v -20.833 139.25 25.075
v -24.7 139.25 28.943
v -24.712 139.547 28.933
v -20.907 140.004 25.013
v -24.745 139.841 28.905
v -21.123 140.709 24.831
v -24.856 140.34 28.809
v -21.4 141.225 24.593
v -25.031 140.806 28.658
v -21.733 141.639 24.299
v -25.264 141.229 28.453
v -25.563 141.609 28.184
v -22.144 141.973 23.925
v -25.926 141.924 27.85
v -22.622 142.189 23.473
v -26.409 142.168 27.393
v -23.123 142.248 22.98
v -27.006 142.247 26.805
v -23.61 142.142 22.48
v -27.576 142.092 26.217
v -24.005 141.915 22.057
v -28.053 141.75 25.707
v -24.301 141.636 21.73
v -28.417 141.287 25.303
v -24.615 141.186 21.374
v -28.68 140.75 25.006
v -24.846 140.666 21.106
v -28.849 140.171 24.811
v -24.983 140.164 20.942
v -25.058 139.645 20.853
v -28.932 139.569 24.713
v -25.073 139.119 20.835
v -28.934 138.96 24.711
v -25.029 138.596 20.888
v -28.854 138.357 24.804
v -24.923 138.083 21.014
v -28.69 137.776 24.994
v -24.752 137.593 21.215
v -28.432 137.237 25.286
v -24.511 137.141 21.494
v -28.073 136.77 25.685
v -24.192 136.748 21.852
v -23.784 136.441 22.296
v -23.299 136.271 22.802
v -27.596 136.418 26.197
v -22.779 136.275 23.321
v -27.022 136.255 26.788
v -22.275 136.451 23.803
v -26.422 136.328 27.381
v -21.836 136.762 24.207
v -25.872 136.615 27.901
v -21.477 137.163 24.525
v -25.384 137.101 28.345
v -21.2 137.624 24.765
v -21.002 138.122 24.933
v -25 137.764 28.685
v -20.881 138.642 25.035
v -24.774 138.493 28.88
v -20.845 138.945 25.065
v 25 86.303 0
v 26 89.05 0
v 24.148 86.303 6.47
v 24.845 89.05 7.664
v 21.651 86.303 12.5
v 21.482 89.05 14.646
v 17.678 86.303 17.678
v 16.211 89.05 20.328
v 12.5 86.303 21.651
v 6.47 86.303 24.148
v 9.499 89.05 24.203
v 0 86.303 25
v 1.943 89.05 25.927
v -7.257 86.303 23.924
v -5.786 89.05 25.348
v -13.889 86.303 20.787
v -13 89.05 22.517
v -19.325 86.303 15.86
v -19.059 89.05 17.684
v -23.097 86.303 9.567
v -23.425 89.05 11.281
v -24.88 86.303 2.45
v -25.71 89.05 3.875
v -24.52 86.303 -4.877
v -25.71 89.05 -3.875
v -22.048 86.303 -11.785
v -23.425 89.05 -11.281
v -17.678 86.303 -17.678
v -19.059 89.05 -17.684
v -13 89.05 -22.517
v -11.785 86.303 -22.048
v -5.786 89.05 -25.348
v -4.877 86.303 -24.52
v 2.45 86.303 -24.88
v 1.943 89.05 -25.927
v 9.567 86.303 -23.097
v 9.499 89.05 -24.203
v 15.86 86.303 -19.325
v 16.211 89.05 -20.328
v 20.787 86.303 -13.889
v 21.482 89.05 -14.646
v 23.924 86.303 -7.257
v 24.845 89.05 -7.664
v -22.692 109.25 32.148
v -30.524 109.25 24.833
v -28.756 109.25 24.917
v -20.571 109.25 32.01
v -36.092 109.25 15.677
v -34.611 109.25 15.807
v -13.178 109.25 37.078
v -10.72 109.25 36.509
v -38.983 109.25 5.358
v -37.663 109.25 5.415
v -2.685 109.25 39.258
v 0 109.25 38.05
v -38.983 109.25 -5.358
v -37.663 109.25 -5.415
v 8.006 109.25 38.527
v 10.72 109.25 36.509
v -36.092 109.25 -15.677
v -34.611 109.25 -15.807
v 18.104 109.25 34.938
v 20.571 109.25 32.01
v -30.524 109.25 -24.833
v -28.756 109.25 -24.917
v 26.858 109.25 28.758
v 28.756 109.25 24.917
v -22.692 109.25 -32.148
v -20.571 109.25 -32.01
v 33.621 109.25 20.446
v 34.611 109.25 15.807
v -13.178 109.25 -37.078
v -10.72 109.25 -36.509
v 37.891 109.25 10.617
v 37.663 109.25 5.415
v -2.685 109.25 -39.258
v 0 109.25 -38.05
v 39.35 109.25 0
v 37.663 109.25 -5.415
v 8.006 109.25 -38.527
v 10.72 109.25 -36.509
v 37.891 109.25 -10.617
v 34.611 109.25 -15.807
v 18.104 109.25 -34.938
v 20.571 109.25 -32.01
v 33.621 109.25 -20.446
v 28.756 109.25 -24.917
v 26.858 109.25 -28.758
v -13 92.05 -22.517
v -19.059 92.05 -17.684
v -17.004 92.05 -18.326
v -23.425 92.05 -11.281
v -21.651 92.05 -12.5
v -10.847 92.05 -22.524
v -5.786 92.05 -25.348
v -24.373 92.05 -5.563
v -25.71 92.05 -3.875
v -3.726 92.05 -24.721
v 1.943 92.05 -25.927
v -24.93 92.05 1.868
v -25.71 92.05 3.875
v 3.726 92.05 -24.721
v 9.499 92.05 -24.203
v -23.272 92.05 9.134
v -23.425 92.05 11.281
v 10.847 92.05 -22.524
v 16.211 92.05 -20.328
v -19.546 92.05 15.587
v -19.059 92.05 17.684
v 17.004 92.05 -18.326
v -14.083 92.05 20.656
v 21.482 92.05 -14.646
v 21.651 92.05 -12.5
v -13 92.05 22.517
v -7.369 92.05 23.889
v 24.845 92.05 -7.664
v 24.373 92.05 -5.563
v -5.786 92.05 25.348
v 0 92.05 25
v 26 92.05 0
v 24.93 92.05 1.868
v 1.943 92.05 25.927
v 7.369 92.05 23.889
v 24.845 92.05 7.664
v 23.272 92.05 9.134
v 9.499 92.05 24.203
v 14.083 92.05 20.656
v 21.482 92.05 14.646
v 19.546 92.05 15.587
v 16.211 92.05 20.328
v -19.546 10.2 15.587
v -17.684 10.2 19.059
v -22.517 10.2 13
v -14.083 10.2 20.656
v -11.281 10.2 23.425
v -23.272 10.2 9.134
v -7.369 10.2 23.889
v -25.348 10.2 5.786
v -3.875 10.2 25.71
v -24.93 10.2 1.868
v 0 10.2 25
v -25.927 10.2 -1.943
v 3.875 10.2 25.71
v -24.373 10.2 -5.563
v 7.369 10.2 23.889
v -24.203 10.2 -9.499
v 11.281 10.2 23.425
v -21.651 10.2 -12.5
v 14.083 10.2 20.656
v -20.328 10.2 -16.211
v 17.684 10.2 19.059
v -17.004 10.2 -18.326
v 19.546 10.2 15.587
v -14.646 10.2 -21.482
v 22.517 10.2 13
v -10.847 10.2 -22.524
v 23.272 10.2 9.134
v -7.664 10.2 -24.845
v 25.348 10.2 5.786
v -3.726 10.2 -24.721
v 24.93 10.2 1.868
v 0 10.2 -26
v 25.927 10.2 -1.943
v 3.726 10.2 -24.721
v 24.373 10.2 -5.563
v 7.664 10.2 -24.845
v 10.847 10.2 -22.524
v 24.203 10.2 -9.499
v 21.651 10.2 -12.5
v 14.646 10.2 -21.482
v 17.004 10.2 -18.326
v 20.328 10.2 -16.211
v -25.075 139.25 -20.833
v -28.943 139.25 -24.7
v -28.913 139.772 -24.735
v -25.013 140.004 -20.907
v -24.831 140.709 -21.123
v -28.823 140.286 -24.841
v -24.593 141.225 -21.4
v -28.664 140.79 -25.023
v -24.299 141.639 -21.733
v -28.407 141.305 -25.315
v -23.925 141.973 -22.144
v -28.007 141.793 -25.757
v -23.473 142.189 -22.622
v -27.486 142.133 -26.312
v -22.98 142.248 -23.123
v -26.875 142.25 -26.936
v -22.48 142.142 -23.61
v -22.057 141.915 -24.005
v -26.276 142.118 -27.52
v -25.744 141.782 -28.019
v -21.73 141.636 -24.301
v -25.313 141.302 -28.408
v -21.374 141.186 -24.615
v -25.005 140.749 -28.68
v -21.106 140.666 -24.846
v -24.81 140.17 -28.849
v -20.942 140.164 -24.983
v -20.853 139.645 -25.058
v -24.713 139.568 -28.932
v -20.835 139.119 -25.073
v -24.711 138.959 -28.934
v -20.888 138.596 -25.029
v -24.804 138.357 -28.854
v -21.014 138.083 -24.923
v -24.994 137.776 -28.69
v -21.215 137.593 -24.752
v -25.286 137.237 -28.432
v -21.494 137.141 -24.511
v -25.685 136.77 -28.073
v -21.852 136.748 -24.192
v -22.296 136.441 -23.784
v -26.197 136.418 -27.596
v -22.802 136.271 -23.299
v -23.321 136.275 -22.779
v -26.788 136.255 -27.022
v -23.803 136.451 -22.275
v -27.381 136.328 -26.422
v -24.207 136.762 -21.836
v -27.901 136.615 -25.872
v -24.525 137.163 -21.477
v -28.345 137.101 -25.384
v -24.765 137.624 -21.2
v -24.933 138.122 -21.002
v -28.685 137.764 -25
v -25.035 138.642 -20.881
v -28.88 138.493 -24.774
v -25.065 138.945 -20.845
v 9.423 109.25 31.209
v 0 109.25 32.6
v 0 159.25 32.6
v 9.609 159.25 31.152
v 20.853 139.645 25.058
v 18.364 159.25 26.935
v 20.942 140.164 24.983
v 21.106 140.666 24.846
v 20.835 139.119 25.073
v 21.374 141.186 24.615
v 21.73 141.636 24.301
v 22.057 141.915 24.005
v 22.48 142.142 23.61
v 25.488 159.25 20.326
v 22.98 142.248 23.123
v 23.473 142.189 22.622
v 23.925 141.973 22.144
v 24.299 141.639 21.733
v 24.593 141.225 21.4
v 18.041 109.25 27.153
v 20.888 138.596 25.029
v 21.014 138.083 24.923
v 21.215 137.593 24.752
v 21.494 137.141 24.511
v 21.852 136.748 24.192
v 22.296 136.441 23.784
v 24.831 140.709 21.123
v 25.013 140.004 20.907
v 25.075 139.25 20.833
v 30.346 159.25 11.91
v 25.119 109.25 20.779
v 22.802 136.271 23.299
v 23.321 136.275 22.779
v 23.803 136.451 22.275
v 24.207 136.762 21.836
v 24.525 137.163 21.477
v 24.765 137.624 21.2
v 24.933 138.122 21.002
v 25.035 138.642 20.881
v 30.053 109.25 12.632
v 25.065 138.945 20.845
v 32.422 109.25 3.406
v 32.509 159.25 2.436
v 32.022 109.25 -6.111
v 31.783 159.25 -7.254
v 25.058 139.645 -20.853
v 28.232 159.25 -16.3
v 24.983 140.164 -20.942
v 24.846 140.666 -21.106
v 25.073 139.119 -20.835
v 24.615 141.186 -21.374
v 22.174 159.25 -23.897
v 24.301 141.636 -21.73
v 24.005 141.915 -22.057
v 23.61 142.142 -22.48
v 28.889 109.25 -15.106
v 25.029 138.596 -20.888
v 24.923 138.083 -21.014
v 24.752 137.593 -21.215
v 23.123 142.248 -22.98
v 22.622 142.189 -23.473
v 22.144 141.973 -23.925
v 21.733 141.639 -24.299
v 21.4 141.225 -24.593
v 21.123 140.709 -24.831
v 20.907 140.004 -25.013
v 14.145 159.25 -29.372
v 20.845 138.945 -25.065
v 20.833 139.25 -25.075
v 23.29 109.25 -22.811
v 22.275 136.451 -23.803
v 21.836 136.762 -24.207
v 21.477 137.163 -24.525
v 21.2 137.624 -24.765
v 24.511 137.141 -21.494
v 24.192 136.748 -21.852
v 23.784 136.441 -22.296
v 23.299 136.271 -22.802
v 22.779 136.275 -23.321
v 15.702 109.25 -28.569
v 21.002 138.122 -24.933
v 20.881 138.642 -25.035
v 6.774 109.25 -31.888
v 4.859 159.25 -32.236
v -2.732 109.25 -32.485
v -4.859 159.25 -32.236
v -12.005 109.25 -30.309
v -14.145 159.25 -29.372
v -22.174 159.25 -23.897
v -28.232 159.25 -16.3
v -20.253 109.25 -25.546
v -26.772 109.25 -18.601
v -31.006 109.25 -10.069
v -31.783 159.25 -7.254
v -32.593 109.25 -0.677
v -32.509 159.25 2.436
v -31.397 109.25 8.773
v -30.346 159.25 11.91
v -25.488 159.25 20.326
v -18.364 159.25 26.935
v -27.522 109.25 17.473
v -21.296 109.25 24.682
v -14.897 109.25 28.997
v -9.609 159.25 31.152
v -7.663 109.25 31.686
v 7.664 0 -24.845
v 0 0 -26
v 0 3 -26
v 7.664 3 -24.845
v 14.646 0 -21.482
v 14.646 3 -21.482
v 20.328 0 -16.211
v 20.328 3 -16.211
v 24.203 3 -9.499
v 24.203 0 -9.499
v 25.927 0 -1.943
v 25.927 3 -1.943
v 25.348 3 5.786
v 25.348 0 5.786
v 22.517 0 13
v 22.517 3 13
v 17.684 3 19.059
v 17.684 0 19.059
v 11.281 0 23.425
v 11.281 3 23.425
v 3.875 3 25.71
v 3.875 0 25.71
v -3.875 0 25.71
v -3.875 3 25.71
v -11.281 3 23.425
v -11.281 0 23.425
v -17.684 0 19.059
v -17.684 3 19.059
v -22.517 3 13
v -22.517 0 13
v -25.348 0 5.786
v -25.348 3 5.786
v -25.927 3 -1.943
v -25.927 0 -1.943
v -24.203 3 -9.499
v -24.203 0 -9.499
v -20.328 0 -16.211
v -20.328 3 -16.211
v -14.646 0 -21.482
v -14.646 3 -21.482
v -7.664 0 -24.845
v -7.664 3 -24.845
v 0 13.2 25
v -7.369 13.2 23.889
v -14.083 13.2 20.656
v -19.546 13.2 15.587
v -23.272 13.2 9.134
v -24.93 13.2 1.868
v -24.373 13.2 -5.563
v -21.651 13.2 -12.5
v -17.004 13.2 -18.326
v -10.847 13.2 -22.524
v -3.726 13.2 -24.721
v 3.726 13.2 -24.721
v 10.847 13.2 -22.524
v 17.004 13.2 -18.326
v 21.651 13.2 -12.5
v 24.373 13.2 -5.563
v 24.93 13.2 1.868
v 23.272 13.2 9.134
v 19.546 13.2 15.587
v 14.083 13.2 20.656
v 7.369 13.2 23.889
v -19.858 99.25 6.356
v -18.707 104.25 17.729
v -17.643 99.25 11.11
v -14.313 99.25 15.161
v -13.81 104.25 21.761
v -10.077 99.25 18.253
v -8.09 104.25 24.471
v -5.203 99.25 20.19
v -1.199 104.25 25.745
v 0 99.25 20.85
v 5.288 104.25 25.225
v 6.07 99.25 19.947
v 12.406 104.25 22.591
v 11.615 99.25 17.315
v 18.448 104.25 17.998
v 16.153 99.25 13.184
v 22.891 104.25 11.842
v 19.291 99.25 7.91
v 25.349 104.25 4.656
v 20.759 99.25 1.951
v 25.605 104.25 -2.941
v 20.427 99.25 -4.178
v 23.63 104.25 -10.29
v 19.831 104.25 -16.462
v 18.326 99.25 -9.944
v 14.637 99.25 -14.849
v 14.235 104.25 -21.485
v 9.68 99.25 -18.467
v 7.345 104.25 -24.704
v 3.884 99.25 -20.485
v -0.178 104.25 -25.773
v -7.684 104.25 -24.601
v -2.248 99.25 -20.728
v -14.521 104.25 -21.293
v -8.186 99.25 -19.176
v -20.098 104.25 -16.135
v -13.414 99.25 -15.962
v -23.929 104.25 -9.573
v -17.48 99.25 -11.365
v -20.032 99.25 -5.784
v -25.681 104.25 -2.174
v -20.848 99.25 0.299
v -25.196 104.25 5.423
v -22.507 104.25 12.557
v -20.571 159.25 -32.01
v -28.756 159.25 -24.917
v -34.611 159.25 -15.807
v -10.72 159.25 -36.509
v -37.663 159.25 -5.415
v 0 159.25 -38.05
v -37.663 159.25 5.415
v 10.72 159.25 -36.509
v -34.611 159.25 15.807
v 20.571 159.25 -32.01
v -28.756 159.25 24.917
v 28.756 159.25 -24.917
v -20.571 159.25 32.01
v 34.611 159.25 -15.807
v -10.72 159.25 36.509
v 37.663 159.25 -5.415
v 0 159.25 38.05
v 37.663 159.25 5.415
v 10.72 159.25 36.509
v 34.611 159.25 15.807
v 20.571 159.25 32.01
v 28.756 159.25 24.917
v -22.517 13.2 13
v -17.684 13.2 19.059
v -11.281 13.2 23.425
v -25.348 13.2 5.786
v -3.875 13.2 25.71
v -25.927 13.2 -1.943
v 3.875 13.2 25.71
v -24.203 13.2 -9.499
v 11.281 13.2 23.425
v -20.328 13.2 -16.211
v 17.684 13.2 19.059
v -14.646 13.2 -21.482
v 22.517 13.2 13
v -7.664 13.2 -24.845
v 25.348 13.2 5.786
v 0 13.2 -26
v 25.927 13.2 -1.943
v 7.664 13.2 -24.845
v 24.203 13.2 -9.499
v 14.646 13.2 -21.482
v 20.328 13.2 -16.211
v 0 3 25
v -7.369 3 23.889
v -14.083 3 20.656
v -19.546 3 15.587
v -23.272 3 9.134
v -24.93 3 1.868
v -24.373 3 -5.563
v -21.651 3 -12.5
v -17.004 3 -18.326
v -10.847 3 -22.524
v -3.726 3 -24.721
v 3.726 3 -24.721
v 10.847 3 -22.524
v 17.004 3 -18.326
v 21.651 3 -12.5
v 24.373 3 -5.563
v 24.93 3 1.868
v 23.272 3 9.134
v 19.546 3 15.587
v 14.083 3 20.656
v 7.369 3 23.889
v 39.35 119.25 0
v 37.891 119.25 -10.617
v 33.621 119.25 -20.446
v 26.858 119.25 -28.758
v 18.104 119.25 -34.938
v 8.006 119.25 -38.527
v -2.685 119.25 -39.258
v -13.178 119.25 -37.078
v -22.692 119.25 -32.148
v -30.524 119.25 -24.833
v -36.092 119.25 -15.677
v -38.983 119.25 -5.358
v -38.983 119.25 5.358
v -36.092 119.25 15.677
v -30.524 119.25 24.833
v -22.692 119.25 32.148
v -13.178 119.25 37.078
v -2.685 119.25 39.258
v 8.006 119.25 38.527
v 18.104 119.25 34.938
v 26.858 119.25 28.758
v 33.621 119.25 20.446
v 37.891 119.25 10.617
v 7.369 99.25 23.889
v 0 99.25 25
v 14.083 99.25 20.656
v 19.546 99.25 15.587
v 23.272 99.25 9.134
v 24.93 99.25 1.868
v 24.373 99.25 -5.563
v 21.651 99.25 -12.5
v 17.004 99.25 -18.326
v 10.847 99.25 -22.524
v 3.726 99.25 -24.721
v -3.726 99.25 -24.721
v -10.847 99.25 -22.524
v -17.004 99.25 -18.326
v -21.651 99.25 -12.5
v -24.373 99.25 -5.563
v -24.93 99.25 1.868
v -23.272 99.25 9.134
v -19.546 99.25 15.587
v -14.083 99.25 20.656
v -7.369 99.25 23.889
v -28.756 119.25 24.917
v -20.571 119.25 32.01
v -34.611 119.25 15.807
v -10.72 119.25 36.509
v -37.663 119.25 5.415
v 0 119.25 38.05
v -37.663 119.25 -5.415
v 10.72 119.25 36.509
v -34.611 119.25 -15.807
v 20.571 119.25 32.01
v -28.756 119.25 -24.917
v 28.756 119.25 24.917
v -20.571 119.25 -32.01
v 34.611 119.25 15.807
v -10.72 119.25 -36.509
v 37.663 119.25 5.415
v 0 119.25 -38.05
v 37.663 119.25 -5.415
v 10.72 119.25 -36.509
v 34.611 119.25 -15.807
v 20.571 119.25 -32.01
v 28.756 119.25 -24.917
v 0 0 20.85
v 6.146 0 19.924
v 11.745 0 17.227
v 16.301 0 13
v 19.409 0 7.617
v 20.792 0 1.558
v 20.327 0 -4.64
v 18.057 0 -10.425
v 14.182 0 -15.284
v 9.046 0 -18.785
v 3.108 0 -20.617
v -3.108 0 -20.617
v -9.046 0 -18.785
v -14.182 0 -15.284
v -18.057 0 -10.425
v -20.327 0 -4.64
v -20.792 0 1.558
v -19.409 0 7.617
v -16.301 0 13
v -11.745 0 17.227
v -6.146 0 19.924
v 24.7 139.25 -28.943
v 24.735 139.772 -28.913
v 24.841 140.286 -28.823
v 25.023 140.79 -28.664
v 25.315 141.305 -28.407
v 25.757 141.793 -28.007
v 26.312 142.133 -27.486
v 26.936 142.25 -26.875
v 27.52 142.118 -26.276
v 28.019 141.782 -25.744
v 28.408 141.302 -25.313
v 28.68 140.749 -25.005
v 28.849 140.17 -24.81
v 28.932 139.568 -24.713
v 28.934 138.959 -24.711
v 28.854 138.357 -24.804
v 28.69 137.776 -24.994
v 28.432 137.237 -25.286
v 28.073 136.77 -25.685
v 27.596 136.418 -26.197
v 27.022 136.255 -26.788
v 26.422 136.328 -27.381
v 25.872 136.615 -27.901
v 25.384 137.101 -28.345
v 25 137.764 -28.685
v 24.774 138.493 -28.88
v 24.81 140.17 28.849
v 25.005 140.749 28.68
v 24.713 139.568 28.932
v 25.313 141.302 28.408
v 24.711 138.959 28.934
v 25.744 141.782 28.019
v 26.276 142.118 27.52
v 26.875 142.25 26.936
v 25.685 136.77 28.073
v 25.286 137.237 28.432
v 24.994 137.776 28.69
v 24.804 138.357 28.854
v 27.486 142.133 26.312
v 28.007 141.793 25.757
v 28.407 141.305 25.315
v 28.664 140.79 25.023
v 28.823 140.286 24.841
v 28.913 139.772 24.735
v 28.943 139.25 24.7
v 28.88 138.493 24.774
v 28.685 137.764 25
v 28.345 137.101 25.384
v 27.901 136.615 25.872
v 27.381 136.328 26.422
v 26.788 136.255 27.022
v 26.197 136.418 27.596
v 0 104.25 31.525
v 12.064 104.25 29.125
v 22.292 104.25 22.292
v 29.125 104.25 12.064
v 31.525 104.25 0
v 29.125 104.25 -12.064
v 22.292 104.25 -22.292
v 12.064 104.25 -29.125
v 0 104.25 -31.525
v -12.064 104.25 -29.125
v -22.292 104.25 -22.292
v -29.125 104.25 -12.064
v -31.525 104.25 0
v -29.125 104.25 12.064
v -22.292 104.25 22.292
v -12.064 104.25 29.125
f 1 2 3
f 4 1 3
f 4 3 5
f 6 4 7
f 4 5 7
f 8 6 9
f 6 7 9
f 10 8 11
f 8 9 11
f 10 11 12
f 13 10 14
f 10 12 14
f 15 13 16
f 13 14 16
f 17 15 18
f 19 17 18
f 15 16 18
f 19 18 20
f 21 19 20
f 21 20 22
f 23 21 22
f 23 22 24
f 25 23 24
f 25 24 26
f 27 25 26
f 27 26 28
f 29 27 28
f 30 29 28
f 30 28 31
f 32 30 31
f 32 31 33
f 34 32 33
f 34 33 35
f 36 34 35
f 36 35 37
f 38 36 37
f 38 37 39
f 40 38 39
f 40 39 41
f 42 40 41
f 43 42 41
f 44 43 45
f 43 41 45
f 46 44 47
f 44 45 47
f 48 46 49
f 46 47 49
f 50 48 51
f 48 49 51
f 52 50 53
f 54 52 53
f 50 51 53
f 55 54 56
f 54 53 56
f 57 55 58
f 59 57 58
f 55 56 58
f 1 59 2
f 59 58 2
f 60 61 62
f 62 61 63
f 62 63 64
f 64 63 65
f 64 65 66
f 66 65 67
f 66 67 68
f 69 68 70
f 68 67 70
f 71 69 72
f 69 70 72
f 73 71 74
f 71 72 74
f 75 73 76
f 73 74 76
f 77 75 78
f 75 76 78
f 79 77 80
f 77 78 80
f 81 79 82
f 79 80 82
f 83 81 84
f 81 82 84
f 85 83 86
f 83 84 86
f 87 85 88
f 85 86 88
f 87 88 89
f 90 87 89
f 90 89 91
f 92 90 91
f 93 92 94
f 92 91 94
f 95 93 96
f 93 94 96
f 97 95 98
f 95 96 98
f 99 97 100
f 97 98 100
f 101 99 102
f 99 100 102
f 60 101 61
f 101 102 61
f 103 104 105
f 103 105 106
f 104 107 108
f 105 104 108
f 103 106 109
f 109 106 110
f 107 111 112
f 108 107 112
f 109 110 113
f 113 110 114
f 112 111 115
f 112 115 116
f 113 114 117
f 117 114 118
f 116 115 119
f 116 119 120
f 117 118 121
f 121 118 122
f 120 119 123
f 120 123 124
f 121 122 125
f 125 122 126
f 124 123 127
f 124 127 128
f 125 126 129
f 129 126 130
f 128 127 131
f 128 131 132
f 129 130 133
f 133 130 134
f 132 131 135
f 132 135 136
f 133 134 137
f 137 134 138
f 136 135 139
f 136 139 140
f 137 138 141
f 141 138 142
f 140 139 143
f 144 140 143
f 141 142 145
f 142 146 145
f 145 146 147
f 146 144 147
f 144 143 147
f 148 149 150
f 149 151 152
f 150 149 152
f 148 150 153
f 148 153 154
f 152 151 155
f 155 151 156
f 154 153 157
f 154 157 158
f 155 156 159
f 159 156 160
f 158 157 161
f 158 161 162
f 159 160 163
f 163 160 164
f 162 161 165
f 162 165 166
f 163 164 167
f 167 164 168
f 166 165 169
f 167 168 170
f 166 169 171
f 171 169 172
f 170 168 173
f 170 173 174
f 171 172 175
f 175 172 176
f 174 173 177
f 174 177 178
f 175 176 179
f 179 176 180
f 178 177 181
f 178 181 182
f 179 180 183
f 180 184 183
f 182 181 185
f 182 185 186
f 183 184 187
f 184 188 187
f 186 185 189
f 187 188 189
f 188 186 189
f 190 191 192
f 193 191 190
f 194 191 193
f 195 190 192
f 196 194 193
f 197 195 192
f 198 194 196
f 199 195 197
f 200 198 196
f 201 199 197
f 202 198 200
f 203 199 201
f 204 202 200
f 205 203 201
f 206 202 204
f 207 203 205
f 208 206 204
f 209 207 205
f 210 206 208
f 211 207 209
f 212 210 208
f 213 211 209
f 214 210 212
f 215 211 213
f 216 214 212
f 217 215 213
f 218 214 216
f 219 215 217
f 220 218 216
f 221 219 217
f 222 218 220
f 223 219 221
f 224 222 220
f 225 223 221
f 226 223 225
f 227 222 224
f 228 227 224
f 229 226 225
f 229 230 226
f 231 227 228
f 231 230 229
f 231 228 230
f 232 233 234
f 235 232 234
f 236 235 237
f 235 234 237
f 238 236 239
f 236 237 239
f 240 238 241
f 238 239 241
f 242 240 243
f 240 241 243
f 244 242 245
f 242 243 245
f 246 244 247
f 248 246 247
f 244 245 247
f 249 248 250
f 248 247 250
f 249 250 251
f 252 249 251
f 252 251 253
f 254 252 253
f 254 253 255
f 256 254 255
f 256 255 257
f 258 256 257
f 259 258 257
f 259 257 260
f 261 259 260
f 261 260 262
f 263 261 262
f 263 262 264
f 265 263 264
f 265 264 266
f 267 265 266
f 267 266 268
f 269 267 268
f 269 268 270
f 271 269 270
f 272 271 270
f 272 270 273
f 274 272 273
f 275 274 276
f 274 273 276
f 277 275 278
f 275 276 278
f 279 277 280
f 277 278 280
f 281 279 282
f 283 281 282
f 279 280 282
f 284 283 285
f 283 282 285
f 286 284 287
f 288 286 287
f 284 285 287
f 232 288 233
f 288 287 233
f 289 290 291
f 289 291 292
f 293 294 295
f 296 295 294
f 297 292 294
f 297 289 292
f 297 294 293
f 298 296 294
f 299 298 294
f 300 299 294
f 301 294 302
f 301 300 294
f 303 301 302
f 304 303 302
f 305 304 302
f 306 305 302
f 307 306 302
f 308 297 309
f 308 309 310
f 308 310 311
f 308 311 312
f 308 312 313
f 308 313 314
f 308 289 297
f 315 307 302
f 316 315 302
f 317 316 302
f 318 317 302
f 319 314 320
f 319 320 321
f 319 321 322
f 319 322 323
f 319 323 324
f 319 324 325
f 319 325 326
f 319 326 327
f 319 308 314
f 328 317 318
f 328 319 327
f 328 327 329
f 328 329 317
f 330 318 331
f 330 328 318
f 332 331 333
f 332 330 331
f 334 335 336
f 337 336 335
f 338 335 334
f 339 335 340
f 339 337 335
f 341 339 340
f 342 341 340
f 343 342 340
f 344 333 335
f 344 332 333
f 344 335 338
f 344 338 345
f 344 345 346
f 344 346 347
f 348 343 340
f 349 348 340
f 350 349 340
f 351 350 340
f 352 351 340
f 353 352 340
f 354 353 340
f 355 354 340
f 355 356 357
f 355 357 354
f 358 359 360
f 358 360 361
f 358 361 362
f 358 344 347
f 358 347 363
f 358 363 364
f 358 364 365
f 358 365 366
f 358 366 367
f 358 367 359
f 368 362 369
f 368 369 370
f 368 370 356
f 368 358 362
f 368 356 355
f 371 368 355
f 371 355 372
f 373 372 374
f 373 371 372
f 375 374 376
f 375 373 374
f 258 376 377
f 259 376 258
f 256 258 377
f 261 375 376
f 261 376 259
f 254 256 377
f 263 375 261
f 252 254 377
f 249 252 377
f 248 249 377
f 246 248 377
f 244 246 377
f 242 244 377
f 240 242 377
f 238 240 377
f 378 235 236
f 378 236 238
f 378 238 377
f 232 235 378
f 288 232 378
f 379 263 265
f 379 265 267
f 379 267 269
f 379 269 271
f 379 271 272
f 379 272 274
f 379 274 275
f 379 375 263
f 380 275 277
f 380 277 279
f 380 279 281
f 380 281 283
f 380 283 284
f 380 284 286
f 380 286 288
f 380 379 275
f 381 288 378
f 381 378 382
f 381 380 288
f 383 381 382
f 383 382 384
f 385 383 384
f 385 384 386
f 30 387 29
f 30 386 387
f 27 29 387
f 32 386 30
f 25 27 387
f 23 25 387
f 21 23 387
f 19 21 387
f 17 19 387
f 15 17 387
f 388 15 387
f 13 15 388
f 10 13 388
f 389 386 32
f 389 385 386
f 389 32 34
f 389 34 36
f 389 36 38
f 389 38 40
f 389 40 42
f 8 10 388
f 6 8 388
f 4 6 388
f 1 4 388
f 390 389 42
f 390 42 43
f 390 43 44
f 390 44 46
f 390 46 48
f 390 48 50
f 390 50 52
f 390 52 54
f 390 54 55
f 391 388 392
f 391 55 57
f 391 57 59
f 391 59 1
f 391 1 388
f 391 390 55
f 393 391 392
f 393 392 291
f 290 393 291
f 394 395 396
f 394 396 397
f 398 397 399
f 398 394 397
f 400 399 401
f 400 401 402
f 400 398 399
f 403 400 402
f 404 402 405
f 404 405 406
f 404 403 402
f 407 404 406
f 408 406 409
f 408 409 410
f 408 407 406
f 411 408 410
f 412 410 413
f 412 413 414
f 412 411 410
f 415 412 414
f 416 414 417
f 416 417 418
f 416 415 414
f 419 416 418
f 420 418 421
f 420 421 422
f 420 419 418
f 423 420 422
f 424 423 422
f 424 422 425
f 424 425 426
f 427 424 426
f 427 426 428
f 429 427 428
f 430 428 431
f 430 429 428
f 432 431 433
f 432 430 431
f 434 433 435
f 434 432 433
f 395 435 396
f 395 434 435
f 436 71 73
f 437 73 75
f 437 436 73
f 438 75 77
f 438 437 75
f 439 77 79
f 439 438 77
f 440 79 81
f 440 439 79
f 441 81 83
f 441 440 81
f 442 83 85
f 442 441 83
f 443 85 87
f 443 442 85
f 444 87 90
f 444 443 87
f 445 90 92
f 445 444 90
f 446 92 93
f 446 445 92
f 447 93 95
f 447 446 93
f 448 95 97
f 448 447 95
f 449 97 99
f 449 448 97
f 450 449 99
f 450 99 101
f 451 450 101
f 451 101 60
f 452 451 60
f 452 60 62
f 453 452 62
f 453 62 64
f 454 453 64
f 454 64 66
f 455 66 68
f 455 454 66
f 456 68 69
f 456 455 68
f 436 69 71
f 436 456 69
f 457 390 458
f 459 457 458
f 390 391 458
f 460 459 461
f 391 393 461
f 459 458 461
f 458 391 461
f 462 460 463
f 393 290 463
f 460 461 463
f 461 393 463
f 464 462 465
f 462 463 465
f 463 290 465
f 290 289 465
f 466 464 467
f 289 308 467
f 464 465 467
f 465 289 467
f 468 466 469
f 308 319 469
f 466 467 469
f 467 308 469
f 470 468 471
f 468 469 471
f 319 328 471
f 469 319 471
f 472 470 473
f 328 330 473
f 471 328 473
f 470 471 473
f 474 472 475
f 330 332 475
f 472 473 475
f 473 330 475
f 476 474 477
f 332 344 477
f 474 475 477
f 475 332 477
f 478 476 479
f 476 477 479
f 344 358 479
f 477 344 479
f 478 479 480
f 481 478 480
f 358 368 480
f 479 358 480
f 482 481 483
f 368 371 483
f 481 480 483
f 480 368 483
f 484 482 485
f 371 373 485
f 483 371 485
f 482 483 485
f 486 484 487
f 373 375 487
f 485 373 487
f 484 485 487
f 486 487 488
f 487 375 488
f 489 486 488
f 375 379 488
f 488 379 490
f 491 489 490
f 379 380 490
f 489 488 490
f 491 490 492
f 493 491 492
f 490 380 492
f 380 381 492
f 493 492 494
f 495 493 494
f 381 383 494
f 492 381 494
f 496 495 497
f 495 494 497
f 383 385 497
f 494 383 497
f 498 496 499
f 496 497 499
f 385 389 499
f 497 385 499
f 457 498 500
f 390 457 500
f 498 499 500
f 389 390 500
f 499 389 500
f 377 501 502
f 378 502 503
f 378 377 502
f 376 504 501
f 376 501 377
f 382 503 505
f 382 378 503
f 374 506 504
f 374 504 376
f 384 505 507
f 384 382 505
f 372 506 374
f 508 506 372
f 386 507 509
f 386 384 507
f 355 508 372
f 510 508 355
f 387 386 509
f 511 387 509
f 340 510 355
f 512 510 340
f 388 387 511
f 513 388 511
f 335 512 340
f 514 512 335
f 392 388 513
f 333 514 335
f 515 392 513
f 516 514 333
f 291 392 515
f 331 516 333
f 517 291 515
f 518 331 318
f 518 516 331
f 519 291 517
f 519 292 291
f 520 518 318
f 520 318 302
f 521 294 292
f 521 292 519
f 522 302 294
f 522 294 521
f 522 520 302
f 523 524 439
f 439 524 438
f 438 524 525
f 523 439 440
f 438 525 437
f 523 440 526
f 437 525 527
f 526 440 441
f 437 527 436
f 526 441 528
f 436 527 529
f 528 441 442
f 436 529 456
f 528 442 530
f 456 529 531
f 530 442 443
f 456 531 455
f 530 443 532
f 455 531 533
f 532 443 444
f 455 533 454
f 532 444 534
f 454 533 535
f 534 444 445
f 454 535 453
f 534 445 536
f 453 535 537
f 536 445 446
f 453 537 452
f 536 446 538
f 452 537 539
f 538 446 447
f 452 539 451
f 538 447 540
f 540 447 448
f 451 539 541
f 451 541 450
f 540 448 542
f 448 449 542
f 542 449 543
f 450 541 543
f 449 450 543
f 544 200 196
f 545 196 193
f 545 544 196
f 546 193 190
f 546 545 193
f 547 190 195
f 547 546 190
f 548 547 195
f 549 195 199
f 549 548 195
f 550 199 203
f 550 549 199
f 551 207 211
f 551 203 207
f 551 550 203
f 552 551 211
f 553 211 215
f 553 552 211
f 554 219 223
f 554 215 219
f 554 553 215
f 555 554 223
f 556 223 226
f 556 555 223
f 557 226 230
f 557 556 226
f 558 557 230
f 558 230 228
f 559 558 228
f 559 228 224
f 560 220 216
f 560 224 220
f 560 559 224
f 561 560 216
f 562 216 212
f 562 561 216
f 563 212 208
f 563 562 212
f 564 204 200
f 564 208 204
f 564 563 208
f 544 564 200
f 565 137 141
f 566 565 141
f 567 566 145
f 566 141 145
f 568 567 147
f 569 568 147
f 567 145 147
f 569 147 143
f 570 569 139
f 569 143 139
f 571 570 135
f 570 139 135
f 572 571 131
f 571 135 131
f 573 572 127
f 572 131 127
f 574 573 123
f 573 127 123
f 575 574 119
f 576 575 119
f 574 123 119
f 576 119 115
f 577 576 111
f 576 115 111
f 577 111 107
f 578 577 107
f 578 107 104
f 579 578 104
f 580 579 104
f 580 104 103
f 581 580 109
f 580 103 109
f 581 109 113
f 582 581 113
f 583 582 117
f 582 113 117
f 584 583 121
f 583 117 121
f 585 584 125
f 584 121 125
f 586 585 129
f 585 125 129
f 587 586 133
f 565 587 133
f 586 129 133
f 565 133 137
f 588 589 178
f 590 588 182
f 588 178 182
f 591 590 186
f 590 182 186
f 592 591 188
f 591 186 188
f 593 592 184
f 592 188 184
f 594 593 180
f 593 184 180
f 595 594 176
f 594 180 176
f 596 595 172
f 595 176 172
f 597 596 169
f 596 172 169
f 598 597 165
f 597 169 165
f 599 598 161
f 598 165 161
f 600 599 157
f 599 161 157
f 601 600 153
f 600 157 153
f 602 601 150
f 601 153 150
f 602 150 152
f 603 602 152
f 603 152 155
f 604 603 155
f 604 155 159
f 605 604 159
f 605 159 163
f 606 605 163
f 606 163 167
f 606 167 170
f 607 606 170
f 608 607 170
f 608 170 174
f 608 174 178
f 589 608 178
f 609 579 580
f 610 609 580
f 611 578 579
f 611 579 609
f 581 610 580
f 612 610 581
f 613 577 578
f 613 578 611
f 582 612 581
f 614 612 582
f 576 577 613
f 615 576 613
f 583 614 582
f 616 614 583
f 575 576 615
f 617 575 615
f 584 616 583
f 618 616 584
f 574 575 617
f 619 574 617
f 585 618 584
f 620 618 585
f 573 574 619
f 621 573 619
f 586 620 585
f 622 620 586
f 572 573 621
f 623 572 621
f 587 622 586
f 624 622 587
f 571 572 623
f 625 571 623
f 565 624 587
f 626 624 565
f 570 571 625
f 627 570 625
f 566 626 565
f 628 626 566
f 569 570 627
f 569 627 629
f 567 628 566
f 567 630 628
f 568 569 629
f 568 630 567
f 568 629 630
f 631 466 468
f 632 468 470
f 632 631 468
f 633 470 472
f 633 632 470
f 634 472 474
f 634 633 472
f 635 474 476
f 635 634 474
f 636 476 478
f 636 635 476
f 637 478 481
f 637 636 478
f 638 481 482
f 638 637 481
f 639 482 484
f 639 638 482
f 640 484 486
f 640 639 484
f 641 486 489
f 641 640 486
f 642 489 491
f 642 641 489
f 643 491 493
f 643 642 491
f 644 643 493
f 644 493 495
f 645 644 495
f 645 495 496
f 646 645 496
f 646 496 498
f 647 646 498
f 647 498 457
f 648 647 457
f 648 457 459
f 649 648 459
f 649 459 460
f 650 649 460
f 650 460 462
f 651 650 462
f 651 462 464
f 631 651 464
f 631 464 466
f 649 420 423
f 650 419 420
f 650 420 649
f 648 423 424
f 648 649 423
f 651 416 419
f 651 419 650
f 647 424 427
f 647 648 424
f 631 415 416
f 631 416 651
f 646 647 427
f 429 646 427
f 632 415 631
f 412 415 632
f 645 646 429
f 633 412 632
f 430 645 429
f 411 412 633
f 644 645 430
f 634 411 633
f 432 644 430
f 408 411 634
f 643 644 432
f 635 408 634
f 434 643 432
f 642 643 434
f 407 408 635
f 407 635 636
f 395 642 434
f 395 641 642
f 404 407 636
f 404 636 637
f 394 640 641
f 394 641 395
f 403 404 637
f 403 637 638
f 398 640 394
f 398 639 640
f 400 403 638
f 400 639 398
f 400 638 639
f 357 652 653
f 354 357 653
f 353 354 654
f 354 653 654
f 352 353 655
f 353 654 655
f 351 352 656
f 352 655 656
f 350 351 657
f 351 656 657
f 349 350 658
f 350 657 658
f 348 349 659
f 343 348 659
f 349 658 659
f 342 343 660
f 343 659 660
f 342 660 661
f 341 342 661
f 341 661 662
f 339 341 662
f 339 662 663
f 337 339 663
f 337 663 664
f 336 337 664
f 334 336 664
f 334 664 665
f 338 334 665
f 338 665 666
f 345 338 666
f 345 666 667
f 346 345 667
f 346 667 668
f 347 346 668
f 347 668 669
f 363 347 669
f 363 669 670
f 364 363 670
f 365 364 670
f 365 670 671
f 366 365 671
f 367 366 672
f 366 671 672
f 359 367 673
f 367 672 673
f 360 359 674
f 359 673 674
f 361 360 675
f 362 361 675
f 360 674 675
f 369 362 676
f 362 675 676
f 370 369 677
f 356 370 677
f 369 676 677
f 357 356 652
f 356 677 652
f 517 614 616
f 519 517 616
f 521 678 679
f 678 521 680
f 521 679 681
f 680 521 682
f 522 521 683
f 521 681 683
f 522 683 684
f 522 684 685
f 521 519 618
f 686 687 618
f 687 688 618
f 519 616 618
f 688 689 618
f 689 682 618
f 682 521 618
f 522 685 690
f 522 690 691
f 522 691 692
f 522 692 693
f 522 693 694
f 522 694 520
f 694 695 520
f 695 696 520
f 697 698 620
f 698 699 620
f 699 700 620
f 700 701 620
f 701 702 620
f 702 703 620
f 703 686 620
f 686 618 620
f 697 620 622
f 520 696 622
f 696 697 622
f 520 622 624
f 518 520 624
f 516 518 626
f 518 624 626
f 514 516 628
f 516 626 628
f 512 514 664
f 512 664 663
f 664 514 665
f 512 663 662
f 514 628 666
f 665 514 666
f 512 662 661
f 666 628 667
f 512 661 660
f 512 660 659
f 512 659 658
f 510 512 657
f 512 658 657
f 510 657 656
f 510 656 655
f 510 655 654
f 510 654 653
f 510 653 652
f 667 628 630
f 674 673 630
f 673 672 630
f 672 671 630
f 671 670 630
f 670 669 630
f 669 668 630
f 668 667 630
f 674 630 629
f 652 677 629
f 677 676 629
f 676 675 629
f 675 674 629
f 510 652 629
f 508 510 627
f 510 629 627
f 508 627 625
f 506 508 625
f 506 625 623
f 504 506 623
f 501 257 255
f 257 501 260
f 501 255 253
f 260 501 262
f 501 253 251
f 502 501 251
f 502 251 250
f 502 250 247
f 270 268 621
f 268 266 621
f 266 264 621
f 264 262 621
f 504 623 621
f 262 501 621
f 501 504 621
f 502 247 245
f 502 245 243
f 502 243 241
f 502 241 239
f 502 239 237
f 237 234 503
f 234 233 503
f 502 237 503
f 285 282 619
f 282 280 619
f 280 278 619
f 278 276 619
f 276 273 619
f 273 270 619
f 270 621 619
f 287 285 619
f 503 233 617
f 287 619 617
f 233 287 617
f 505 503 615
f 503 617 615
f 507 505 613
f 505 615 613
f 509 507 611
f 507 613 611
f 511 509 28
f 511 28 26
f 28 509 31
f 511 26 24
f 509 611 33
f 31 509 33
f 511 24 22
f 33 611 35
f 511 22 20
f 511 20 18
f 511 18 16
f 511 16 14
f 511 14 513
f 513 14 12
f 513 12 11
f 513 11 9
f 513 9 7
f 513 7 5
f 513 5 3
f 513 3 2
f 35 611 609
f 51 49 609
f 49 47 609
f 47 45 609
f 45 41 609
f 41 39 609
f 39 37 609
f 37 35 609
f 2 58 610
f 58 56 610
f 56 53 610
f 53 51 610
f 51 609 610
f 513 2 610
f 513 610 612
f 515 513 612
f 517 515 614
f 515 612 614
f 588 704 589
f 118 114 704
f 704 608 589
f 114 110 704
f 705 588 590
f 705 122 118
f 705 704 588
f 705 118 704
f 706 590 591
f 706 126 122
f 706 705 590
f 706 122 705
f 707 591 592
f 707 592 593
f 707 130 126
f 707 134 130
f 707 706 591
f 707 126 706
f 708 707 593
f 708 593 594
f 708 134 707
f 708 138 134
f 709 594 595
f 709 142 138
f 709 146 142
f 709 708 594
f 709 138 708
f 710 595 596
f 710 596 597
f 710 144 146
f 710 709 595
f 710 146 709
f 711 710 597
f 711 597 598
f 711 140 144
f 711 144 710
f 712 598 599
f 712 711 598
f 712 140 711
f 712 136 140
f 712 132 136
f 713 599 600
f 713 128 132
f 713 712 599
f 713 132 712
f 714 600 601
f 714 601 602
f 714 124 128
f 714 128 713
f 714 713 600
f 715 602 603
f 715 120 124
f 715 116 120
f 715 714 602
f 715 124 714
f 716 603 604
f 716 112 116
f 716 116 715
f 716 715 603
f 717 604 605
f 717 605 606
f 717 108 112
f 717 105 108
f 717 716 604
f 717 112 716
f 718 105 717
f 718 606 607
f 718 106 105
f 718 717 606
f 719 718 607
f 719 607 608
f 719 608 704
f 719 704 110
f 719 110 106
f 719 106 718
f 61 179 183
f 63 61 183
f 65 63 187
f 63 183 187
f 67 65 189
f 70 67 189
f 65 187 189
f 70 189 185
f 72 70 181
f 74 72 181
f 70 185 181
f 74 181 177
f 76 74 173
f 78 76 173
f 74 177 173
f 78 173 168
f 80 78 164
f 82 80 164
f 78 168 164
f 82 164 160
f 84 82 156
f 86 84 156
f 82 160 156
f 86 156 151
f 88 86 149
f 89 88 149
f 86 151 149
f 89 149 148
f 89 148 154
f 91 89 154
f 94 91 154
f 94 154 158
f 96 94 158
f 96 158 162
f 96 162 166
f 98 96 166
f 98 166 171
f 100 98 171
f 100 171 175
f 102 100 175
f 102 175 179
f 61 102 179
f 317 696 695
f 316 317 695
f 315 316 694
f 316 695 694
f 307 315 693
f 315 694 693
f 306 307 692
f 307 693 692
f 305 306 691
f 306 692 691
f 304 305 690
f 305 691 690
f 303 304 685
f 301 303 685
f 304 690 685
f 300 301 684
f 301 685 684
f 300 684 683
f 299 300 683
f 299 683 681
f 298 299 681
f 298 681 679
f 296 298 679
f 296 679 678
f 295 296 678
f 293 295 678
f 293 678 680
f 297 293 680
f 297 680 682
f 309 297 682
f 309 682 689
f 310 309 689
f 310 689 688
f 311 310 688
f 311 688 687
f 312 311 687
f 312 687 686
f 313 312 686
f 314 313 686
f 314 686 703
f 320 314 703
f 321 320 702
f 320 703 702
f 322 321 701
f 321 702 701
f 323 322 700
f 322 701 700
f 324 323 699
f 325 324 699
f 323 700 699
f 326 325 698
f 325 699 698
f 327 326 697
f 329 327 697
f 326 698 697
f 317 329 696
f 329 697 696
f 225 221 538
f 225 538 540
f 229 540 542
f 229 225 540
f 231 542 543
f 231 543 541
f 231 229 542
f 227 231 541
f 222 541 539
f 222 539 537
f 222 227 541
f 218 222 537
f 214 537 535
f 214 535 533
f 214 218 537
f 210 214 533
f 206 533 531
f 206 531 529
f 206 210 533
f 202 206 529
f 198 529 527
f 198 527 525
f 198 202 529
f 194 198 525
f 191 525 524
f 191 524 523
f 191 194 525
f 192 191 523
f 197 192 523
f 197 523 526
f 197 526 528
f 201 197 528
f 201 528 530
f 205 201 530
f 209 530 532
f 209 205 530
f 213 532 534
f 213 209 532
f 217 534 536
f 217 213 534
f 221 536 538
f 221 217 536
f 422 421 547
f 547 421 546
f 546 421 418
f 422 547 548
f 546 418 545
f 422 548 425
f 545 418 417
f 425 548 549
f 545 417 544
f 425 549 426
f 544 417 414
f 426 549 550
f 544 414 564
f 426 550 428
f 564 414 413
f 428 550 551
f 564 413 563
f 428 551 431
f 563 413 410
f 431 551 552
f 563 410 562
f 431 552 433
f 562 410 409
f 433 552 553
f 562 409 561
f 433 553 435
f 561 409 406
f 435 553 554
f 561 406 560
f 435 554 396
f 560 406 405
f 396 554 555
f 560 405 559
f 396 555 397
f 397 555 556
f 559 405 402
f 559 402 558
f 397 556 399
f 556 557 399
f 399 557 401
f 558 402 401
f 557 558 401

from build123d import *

# Parameters (mm, degrees)
SKETCH2_R                 = 25
SKETCH2_R_2               = 20.85
BOSS_EXTRUDE1_DEPTH       = 99.25
BOSS_EXTRUDE2_START       = 10
SKETCH3_R                 = 38.05
SKETCH3_R_2               = 32.6
BOSS_EXTRUDE2_DEPTH       = 50
BOSS_EXTRUDE3_START       = -50
BOSS_EXTRUDE3_OUTLINE_R   = 39.35
BOSS_EXTRUDE3_OUTLINE_R_2 = 38.05
BOSS_EXTRUDE3_DEPTH       = 10
CUT_EXTRUDE1_REACH        = 186.77
CUT_EXTRUDE1_END_RADIUS   = 32.6
SKETCH7_R                 = 3
CIRPATTERN1_COUNT         = 4
SKETCH8_R                 = 26
SKETCH8_R_2               = 25
BOSS_EXTRUDE5_DEPTH       = 3
BOSS_EXTRUDE6_START       = -92.05
BOSS_EXTRUDE6_OUTLINE_R   = 26
BOSS_EXTRUDE6_OUTLINE_R_2 = 25
BOSS_EXTRUDE6_DEPTH       = 6
CHAMFER1_SIZE             = 1.091910703
CHAMFER1_SIZE_2           = 3
BOSS_EXTRUDE7_START       = -10.2
SKETCH10_R                = 26
SKETCH10_R_2              = 25
BOSS_EXTRUDE7_DEPTH       = 3


with BuildPart() as part:
    # Sketch2 → Boss-Extrude1 (new body)
    with BuildSketch(Plane(origin=(0, 0, 0), x_dir=(1, 0, 0), z_dir=(0, 1, 0))):
        with Locations(Location((0, 0, 0), (0, 0, 270))):
            Circle(SKETCH2_R)
        with Locations(Location((0, 0, 0), (0, 0, 270))):
            Circle(SKETCH2_R_2, mode=Mode.SUBTRACT)
    extrude(amount=BOSS_EXTRUDE1_DEPTH)



with BuildPart() as body_2:
    # Sketch3 → Boss-Extrude2 (new body)
    with BuildSketch(Plane(origin=(0, 99.25, 0), x_dir=(1, 0, 0), z_dir=(0, 1, 0)).offset(BOSS_EXTRUDE2_START)):
        with Locations(Location((0, 0, 0), (0, 0, 270))):
            Circle(SKETCH3_R)
        with Locations(Location((0, 0, 0), (0, 0, 270))):
            Circle(SKETCH3_R_2, mode=Mode.SUBTRACT)
    extrude(amount=BOSS_EXTRUDE2_DEPTH)


with BuildPart() as part_1:
    add(part.part)

    add(body_2.part)  # loft3 joins it to this body
    # loft up to a face of the part (loft3)
    loft([Face(Wire([part_1.edges().sort_by_distance((18.224215686, 99.25, -17.113677648))[0]])), Face(Wire([part_1.edges().sort_by_distance((-27.737256273, 109.25, -26.047017381))[0]]))])

    # Cut-Loft1: read off the stored shape, not the designer's step
    # Cut-Loft1: loft between two sections, ruled curve by curve
    cut_loft1_from = [
        Edge.make_bspline([(-19.857674291, 99.25, 6.355727475), (-7.146219341, 99.25, 46.071076058), (32.569129241, 99.25, 33.359621108), (19.857674291, 99.25, -6.355727475), (7.146219341, 99.25, -46.071076058), (-32.569129241, 99.25, -33.359621108), (-19.857674291, 99.25, 6.355727475)], [0, 0, 0, 0, 0.5, 0.5, 0.5, 1, 1, 1, 1], 3, [1, 0.333333333, 0.333333333, 1, 0.333333333, 0.333333333, 1]),
    ]
    cut_loft1_to = [
        Edge.make_bspline([(-21.296342667, 109.25, 24.682499651), (28.068656636, 109.25, 67.275184984), (70.661341969, 109.25, 17.910185682), (21.296342667, 109.25, -24.682499651), (-28.068656636, 109.25, -67.275184984), (-70.661341969, 109.25, -17.910185682), (-21.296342667, 109.25, 24.682499651)], [0, 0, 0, 0, 0.5, 0.5, 0.5, 1, 1, 1, 1], 3, [1, 0.333333333, 0.333333333, 1, 0.333333333, 0.333333333, 1]),
    ]
    cut_loft1 = Solid(Shell([*[Face.make_surface_from_curves(cut_loft1_from[k], cut_loft1_to[k]) for k in range(1)], Face(Wire(cut_loft1_from)), Face(Wire(cut_loft1_to))]))
    add(cut_loft1, mode=Mode.SUBTRACT)

    # Boss-Extrude3: read off the stored shape, not the designer's step
    # Boss-Extrude3 outline → Boss-Extrude3 (add)
    with BuildSketch(Plane(origin=(0, 159.25, 0), x_dir=(1, 0, 0), z_dir=(0, 1, 0)).offset(BOSS_EXTRUDE3_START)):
        Circle(BOSS_EXTRUDE3_OUTLINE_R)
        Circle(BOSS_EXTRUDE3_OUTLINE_R_2, mode=Mode.SUBTRACT)
    extrude(amount=BOSS_EXTRUDE3_DEPTH)

    # Cut-Extrude1: up to this cylinder (the profile starts outside it)
    cut_extrude1_end = Plane(origin=(0, 139.25, 0), z_dir=(0, -1, 0)) * Cylinder(CUT_EXTRUDE1_END_RADIUS, 439.74, mode=Mode.PRIVATE)
    # Sketch7 → Cut-Extrude1 (cut, up to the surface)
    with BuildSketch(Plane(origin=(-26.905413024, 0, 26.905413024), x_dir=(0, -1, 0), z_dir=(-0.7071067811865488, 0, 0.7071067811865464)), mode=Mode.PRIVATE) as cut_extrude1_sk1:
        with Locations(Location((-139.25, 0, 0), (0, 0, 90))):
            Circle(SKETCH7_R)
    cut_extrude1_tool1 = extrude(cut_extrude1_sk1.sketch, amount=-CUT_EXTRUDE1_REACH, mode=Mode.PRIVATE) - cut_extrude1_end
    cut_extrude1 = cut_extrude1_tool1.solids().sort_by_distance((-26.905413, 139.25, 26.905413))[0]
    add(cut_extrude1, mode=Mode.SUBTRACT)

    # CirPattern1: Cut-Extrude1 ×4 about axis
    cirpattern1_axis = Axis((0, 159.25, 0), (0, -1, 0))
    for i in range(1, CIRPATTERN1_COUNT):
        add(cut_extrude1.rotate(cirpattern1_axis, i * 360 / CIRPATTERN1_COUNT), mode=Mode.SUBTRACT)

    # Sketch8 → Boss-Extrude5 (add)
    with BuildSketch(Plane.XZ):
        with Locations(Location((0, 0, 0), (0, 0, 270))):
            Circle(SKETCH8_R)
        with Locations(Location((0, 0, 0), (0, 0, 270))):
            Circle(SKETCH8_R_2, mode=Mode.SUBTRACT)
    extrude(amount=-BOSS_EXTRUDE5_DEPTH)

    # Boss-Extrude6: read off the stored shape, not the designer's step
    # Boss-Extrude6 outline → Boss-Extrude6 (add)
    with BuildSketch(Plane.XZ.offset(BOSS_EXTRUDE6_START)):
        Circle(BOSS_EXTRUDE6_OUTLINE_R)
        Circle(BOSS_EXTRUDE6_OUTLINE_R_2, mode=Mode.SUBTRACT)
    extrude(amount=BOSS_EXTRUDE6_DEPTH)

    # Chamfer1
    # the kernel refuses this chamfer: 3, 1.091910703 mm, written as the material it takes off along each edge
    with BuildSketch(Plane(origin=(0, 86.05, 0), x_dir=(1, 0, 0), z_dir=(0, 0, -1))) as chamfer1_piece_1_section:
        Polygon((26 - CHAMFER1_SIZE, 0), (26, -CHAMFER1_SIZE_2), (26, 0), align=None)
    chamfer1_piece_1 = revolve(axis=Axis((0, 86.05, 0), (0, -1, 0)), mode=Mode.PRIVATE)
    chamfer1_piece_1 = chamfer1_piece_1 - Plane(origin=(0, 86.05, 0), x_dir=(0, 0, 1), z_dir=(0, -1, 0)) * Cylinder(25, 104, mode=Mode.PRIVATE)
    add(chamfer1_piece_1, mode=Mode.SUBTRACT)

    # Sketch10 → Boss-Extrude7 (add)
    with BuildSketch(Plane.XZ.offset(BOSS_EXTRUDE7_START)):
        with Locations(Location((0, 0, 0), (0, 0, 270))):
            Circle(SKETCH10_R)
        with Locations(Location((0, 0, 0), (0, 0, 270))):
            Circle(SKETCH10_R_2, mode=Mode.SUBTRACT)
    extrude(amount=-BOSS_EXTRUDE7_DEPTH)


solid = part_1.part
